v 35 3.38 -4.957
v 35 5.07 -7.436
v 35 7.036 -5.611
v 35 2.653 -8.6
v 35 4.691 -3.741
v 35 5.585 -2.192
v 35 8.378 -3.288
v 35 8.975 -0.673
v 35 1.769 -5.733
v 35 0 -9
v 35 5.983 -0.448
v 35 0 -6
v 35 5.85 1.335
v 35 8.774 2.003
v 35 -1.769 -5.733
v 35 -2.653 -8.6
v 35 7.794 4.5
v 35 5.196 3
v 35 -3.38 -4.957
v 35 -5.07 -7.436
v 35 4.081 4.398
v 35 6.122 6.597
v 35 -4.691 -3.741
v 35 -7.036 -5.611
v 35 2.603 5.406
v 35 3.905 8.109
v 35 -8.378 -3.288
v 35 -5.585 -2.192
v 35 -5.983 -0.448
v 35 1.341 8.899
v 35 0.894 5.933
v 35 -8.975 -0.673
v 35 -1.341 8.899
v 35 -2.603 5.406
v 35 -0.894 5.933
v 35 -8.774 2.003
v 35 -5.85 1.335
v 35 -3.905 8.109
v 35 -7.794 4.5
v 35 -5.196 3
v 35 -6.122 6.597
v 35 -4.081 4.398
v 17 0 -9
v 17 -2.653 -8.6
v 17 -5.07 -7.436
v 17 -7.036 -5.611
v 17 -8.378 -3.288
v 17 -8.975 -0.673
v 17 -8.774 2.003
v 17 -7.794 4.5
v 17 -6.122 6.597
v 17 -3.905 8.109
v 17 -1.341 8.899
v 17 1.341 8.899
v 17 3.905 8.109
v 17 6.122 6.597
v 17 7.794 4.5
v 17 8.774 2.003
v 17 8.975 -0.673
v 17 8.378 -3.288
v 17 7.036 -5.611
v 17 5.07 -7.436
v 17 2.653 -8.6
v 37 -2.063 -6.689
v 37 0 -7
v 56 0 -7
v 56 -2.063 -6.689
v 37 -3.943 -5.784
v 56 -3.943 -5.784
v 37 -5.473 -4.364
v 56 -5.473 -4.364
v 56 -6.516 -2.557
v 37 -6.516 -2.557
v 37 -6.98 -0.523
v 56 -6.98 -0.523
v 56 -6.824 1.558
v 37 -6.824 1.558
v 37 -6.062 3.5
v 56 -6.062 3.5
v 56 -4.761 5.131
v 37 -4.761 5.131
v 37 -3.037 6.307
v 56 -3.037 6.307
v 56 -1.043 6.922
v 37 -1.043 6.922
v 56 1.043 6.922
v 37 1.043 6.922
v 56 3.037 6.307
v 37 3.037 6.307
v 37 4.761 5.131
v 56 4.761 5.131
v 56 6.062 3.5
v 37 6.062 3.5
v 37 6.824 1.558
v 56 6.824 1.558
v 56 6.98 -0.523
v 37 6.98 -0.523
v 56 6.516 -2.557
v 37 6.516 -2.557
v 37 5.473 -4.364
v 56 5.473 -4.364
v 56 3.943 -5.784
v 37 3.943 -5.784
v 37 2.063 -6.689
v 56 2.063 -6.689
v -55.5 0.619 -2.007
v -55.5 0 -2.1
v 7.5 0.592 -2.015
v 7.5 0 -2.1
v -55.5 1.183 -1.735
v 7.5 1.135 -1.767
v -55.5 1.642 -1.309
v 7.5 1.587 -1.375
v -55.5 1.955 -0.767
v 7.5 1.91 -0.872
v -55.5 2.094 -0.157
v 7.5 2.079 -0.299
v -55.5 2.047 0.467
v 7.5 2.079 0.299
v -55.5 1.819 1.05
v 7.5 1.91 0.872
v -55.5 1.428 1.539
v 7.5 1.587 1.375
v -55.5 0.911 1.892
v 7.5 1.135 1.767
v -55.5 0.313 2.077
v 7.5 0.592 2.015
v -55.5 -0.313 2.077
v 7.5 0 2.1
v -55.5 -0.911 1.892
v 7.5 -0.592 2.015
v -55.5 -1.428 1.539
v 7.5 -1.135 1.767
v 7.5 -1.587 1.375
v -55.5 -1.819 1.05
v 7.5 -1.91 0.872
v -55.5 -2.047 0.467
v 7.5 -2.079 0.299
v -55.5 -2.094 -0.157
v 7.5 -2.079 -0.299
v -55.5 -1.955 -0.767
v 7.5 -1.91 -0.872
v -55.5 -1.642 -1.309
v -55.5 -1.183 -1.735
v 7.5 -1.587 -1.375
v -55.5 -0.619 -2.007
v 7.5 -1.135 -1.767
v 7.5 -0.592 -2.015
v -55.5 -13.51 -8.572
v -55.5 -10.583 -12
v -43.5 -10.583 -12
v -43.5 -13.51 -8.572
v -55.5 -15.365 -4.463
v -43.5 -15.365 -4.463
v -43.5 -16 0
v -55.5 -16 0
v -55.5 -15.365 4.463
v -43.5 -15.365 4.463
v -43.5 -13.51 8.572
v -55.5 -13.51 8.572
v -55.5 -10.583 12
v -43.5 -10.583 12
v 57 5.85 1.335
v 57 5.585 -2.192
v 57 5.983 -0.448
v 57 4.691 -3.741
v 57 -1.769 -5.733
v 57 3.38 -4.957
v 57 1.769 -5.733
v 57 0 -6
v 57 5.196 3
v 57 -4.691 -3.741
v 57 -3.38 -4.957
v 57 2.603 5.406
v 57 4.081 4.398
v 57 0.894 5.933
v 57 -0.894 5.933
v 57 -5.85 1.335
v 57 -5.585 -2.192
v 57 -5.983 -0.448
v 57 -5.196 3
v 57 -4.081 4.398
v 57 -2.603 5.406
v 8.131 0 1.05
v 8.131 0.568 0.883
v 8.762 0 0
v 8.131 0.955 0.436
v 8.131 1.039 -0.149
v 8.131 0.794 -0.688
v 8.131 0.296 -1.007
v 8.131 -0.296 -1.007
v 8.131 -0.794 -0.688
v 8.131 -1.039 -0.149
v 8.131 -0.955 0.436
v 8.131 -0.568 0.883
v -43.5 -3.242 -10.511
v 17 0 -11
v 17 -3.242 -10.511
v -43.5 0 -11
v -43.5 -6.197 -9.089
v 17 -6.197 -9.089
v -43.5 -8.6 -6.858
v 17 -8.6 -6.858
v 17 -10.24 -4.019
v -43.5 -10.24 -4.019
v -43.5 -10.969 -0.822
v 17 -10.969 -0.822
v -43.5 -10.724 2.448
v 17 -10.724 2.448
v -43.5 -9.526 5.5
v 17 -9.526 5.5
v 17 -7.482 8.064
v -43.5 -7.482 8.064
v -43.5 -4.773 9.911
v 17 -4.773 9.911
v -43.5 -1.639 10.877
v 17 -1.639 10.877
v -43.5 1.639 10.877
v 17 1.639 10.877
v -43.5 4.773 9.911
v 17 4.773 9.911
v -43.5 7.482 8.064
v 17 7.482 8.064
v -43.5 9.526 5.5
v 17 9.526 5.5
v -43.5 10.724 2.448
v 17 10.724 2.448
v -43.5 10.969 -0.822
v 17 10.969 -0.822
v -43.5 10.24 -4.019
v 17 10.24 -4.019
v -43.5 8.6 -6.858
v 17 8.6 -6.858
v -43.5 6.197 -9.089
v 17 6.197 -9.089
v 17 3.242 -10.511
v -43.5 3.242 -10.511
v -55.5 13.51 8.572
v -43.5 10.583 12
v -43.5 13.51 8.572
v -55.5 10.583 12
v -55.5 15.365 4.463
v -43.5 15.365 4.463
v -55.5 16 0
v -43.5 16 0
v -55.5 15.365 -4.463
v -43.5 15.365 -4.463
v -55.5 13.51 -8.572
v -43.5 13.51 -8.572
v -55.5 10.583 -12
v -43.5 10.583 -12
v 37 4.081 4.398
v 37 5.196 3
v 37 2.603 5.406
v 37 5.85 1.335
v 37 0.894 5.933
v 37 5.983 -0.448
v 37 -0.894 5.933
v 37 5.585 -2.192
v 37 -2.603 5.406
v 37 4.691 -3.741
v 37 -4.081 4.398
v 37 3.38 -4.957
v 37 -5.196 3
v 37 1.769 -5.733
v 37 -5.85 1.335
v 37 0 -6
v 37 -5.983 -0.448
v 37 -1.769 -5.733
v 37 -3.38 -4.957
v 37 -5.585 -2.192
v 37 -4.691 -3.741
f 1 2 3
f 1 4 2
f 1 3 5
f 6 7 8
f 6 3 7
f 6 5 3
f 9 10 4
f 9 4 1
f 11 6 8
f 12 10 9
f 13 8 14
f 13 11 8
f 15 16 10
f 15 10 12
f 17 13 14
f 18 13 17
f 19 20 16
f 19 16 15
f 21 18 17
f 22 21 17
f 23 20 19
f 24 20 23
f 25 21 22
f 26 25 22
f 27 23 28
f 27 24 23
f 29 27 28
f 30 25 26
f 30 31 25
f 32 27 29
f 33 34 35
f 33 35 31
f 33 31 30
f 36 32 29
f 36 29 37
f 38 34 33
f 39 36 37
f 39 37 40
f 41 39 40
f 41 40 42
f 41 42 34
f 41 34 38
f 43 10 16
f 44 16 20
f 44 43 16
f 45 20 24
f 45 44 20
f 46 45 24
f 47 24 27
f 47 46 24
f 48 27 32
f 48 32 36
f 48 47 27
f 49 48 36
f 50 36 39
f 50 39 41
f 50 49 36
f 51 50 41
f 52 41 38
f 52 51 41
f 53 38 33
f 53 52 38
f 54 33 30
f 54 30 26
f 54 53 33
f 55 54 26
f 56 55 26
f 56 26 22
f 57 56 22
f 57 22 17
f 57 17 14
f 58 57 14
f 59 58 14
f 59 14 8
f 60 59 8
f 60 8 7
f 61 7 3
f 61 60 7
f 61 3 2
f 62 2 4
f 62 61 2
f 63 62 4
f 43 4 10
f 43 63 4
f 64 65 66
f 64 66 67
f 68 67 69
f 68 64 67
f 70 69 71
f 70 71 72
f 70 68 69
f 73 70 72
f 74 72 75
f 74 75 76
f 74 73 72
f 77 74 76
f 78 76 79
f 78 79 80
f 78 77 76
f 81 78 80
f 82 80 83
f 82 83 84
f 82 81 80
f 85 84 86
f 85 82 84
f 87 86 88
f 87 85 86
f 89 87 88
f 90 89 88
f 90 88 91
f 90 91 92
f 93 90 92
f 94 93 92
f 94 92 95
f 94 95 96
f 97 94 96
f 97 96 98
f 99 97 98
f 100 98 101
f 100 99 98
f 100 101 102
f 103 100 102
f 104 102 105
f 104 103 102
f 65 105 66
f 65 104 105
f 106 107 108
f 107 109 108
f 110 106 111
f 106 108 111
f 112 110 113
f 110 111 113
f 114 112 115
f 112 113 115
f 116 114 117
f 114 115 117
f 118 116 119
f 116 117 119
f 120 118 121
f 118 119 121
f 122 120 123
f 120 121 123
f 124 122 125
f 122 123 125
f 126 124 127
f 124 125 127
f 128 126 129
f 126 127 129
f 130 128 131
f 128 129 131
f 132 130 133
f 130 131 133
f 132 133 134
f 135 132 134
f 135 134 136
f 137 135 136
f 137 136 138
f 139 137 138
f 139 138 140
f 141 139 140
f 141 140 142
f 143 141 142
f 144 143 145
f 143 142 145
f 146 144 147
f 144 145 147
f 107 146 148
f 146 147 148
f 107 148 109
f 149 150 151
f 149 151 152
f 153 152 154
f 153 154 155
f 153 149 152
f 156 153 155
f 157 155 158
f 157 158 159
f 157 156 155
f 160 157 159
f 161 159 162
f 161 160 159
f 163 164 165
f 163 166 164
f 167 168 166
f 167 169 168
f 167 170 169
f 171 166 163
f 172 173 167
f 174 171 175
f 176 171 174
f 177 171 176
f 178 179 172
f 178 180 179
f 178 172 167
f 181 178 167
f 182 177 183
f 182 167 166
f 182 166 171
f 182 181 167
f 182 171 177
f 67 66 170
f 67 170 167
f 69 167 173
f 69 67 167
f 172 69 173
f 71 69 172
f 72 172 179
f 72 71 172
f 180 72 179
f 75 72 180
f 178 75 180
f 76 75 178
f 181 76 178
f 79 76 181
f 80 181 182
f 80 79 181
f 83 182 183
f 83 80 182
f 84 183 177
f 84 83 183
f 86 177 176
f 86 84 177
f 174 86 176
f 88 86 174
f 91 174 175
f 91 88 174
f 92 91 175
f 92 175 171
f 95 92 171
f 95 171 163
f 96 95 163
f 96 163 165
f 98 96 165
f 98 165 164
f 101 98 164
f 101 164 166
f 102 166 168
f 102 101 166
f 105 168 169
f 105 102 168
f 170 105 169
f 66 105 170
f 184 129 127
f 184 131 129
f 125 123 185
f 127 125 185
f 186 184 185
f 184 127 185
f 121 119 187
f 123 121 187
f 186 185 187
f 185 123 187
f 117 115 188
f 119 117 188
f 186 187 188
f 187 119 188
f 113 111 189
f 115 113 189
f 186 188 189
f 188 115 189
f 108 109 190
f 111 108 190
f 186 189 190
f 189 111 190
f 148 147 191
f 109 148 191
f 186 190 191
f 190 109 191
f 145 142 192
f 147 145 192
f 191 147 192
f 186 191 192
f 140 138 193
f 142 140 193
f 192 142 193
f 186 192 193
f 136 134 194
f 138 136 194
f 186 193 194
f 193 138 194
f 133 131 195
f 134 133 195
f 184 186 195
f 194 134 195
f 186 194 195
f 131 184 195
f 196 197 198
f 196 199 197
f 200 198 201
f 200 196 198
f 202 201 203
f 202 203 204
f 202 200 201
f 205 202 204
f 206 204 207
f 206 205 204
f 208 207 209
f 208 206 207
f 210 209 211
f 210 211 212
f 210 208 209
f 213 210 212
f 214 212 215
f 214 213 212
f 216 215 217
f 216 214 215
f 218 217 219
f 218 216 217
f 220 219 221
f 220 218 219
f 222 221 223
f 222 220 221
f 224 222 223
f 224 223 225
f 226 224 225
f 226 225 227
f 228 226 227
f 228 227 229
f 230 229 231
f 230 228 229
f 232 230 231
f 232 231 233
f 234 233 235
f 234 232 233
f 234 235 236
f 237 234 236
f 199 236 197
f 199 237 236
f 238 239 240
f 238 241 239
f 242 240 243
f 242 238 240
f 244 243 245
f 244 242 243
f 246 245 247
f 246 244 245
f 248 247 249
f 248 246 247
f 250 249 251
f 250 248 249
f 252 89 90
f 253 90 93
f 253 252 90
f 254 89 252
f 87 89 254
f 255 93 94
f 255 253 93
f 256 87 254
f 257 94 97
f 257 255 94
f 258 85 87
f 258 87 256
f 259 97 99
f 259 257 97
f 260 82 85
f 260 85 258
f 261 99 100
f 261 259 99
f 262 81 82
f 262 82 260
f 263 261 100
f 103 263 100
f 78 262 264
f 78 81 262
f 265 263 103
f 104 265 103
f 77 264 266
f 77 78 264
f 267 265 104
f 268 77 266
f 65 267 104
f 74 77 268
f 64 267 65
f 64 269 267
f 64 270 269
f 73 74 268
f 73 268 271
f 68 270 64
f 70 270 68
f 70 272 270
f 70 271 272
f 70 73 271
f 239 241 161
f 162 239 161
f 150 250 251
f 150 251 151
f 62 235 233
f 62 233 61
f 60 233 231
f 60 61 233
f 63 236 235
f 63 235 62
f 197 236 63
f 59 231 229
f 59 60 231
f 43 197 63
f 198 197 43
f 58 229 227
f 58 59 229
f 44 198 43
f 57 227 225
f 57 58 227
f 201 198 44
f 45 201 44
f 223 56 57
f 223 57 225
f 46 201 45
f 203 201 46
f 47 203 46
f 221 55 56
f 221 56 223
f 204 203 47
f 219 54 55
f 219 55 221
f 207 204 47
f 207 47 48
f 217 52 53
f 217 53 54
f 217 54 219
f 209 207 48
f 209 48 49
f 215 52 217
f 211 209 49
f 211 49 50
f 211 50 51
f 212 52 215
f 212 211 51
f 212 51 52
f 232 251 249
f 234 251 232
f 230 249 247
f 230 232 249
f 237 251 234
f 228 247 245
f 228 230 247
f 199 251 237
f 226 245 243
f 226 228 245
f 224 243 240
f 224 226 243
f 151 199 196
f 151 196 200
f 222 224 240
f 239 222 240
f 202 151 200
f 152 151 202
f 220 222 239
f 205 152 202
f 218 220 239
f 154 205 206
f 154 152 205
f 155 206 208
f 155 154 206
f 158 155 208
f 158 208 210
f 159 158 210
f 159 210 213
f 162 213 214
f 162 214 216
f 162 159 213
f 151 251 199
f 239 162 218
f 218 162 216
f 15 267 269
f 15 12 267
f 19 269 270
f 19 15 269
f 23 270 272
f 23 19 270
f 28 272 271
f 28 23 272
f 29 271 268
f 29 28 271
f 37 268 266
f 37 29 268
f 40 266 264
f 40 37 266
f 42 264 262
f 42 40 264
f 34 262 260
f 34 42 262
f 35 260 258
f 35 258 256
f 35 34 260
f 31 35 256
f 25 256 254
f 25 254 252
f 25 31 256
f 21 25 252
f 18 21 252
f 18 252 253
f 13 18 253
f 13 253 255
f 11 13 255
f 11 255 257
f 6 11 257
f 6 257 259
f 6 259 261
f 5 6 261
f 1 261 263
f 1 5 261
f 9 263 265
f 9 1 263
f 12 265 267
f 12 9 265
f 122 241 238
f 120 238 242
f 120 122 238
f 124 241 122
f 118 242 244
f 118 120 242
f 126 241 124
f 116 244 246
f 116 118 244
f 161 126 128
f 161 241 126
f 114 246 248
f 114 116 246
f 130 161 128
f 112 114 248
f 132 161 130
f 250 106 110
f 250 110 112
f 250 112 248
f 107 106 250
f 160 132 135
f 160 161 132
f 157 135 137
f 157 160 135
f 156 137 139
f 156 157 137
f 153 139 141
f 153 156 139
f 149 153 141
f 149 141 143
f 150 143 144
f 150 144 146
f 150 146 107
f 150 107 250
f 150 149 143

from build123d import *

# Parameters (mm, degrees)
CHAMFER1_SIZE             = 1
CUT_EXTRUDE1_DEPTH        = 12
M5X0_8_TAPPED_HOLE1_D     = 4.2
M5X0_8_TAPPED_HOLE1_DEPTH = 63
M5X0_8_TAPPED_HOLE1_TIP   = 1.2618073


with BuildPart() as part:
    # Sketch1 → Revolve1 (revolve)
    with BuildSketch(Plane.XY, mode=Mode.PRIVATE) as revolve1_sk:
        Polygon((17, 11), (-43.5, 11), (-43.5, 16), (-55.5, 16), (-55.5, 0), (57, 0), (57, 7), (37, 7), (37, 6), (35, 6), (35, 9), (17, 9), align=None)
    revolve(revolve1_sk.sketch.rotate(Axis((57, 0, 0), (-1, 0, 0)), 90), axis=Axis((57, 0, 0), (-1, 0, 0)))

    # Chamfer1
    chamfer1_edges = [part.edges().sort_by_distance(p)[0] for p in [
        (57, 0, 7),
    ]]
    chamfer(chamfer1_edges, length=CHAMFER1_SIZE)

    # Sketch2 → Cut-Extrude1 (cut)
    with BuildSketch(Plane.ZY.offset(55.5)):
        with BuildLine():
            Line((12, 10.583005244), (12, -10.583005244))
            ThreePointArc((12, -10.583005244), (16, 0), (12, 10.583005244))
        make_face()
        with BuildLine():
            Line((-12, 10.583005244), (-12, -10.583005244))
            ThreePointArc((-12, -10.583005244), (-16, 0), (-12, 10.583005244))
        make_face()
    extrude(amount=-CUT_EXTRUDE1_DEPTH, mode=Mode.SUBTRACT)

    # M5x0.8 Tapped Hole1
    with Locations(Plane.ZY.offset(55.5)):
        with Locations((0, 0)):
            Hole(M5X0_8_TAPPED_HOLE1_D / 2, depth=M5X0_8_TAPPED_HOLE1_DEPTH)
            with Locations((0, 0, -(M5X0_8_TAPPED_HOLE1_DEPTH + M5X0_8_TAPPED_HOLE1_TIP / 2))):  # 118° drill point
                Cone(0, M5X0_8_TAPPED_HOLE1_D / 2, M5X0_8_TAPPED_HOLE1_TIP, mode=Mode.SUBTRACT)


solid = part.part
